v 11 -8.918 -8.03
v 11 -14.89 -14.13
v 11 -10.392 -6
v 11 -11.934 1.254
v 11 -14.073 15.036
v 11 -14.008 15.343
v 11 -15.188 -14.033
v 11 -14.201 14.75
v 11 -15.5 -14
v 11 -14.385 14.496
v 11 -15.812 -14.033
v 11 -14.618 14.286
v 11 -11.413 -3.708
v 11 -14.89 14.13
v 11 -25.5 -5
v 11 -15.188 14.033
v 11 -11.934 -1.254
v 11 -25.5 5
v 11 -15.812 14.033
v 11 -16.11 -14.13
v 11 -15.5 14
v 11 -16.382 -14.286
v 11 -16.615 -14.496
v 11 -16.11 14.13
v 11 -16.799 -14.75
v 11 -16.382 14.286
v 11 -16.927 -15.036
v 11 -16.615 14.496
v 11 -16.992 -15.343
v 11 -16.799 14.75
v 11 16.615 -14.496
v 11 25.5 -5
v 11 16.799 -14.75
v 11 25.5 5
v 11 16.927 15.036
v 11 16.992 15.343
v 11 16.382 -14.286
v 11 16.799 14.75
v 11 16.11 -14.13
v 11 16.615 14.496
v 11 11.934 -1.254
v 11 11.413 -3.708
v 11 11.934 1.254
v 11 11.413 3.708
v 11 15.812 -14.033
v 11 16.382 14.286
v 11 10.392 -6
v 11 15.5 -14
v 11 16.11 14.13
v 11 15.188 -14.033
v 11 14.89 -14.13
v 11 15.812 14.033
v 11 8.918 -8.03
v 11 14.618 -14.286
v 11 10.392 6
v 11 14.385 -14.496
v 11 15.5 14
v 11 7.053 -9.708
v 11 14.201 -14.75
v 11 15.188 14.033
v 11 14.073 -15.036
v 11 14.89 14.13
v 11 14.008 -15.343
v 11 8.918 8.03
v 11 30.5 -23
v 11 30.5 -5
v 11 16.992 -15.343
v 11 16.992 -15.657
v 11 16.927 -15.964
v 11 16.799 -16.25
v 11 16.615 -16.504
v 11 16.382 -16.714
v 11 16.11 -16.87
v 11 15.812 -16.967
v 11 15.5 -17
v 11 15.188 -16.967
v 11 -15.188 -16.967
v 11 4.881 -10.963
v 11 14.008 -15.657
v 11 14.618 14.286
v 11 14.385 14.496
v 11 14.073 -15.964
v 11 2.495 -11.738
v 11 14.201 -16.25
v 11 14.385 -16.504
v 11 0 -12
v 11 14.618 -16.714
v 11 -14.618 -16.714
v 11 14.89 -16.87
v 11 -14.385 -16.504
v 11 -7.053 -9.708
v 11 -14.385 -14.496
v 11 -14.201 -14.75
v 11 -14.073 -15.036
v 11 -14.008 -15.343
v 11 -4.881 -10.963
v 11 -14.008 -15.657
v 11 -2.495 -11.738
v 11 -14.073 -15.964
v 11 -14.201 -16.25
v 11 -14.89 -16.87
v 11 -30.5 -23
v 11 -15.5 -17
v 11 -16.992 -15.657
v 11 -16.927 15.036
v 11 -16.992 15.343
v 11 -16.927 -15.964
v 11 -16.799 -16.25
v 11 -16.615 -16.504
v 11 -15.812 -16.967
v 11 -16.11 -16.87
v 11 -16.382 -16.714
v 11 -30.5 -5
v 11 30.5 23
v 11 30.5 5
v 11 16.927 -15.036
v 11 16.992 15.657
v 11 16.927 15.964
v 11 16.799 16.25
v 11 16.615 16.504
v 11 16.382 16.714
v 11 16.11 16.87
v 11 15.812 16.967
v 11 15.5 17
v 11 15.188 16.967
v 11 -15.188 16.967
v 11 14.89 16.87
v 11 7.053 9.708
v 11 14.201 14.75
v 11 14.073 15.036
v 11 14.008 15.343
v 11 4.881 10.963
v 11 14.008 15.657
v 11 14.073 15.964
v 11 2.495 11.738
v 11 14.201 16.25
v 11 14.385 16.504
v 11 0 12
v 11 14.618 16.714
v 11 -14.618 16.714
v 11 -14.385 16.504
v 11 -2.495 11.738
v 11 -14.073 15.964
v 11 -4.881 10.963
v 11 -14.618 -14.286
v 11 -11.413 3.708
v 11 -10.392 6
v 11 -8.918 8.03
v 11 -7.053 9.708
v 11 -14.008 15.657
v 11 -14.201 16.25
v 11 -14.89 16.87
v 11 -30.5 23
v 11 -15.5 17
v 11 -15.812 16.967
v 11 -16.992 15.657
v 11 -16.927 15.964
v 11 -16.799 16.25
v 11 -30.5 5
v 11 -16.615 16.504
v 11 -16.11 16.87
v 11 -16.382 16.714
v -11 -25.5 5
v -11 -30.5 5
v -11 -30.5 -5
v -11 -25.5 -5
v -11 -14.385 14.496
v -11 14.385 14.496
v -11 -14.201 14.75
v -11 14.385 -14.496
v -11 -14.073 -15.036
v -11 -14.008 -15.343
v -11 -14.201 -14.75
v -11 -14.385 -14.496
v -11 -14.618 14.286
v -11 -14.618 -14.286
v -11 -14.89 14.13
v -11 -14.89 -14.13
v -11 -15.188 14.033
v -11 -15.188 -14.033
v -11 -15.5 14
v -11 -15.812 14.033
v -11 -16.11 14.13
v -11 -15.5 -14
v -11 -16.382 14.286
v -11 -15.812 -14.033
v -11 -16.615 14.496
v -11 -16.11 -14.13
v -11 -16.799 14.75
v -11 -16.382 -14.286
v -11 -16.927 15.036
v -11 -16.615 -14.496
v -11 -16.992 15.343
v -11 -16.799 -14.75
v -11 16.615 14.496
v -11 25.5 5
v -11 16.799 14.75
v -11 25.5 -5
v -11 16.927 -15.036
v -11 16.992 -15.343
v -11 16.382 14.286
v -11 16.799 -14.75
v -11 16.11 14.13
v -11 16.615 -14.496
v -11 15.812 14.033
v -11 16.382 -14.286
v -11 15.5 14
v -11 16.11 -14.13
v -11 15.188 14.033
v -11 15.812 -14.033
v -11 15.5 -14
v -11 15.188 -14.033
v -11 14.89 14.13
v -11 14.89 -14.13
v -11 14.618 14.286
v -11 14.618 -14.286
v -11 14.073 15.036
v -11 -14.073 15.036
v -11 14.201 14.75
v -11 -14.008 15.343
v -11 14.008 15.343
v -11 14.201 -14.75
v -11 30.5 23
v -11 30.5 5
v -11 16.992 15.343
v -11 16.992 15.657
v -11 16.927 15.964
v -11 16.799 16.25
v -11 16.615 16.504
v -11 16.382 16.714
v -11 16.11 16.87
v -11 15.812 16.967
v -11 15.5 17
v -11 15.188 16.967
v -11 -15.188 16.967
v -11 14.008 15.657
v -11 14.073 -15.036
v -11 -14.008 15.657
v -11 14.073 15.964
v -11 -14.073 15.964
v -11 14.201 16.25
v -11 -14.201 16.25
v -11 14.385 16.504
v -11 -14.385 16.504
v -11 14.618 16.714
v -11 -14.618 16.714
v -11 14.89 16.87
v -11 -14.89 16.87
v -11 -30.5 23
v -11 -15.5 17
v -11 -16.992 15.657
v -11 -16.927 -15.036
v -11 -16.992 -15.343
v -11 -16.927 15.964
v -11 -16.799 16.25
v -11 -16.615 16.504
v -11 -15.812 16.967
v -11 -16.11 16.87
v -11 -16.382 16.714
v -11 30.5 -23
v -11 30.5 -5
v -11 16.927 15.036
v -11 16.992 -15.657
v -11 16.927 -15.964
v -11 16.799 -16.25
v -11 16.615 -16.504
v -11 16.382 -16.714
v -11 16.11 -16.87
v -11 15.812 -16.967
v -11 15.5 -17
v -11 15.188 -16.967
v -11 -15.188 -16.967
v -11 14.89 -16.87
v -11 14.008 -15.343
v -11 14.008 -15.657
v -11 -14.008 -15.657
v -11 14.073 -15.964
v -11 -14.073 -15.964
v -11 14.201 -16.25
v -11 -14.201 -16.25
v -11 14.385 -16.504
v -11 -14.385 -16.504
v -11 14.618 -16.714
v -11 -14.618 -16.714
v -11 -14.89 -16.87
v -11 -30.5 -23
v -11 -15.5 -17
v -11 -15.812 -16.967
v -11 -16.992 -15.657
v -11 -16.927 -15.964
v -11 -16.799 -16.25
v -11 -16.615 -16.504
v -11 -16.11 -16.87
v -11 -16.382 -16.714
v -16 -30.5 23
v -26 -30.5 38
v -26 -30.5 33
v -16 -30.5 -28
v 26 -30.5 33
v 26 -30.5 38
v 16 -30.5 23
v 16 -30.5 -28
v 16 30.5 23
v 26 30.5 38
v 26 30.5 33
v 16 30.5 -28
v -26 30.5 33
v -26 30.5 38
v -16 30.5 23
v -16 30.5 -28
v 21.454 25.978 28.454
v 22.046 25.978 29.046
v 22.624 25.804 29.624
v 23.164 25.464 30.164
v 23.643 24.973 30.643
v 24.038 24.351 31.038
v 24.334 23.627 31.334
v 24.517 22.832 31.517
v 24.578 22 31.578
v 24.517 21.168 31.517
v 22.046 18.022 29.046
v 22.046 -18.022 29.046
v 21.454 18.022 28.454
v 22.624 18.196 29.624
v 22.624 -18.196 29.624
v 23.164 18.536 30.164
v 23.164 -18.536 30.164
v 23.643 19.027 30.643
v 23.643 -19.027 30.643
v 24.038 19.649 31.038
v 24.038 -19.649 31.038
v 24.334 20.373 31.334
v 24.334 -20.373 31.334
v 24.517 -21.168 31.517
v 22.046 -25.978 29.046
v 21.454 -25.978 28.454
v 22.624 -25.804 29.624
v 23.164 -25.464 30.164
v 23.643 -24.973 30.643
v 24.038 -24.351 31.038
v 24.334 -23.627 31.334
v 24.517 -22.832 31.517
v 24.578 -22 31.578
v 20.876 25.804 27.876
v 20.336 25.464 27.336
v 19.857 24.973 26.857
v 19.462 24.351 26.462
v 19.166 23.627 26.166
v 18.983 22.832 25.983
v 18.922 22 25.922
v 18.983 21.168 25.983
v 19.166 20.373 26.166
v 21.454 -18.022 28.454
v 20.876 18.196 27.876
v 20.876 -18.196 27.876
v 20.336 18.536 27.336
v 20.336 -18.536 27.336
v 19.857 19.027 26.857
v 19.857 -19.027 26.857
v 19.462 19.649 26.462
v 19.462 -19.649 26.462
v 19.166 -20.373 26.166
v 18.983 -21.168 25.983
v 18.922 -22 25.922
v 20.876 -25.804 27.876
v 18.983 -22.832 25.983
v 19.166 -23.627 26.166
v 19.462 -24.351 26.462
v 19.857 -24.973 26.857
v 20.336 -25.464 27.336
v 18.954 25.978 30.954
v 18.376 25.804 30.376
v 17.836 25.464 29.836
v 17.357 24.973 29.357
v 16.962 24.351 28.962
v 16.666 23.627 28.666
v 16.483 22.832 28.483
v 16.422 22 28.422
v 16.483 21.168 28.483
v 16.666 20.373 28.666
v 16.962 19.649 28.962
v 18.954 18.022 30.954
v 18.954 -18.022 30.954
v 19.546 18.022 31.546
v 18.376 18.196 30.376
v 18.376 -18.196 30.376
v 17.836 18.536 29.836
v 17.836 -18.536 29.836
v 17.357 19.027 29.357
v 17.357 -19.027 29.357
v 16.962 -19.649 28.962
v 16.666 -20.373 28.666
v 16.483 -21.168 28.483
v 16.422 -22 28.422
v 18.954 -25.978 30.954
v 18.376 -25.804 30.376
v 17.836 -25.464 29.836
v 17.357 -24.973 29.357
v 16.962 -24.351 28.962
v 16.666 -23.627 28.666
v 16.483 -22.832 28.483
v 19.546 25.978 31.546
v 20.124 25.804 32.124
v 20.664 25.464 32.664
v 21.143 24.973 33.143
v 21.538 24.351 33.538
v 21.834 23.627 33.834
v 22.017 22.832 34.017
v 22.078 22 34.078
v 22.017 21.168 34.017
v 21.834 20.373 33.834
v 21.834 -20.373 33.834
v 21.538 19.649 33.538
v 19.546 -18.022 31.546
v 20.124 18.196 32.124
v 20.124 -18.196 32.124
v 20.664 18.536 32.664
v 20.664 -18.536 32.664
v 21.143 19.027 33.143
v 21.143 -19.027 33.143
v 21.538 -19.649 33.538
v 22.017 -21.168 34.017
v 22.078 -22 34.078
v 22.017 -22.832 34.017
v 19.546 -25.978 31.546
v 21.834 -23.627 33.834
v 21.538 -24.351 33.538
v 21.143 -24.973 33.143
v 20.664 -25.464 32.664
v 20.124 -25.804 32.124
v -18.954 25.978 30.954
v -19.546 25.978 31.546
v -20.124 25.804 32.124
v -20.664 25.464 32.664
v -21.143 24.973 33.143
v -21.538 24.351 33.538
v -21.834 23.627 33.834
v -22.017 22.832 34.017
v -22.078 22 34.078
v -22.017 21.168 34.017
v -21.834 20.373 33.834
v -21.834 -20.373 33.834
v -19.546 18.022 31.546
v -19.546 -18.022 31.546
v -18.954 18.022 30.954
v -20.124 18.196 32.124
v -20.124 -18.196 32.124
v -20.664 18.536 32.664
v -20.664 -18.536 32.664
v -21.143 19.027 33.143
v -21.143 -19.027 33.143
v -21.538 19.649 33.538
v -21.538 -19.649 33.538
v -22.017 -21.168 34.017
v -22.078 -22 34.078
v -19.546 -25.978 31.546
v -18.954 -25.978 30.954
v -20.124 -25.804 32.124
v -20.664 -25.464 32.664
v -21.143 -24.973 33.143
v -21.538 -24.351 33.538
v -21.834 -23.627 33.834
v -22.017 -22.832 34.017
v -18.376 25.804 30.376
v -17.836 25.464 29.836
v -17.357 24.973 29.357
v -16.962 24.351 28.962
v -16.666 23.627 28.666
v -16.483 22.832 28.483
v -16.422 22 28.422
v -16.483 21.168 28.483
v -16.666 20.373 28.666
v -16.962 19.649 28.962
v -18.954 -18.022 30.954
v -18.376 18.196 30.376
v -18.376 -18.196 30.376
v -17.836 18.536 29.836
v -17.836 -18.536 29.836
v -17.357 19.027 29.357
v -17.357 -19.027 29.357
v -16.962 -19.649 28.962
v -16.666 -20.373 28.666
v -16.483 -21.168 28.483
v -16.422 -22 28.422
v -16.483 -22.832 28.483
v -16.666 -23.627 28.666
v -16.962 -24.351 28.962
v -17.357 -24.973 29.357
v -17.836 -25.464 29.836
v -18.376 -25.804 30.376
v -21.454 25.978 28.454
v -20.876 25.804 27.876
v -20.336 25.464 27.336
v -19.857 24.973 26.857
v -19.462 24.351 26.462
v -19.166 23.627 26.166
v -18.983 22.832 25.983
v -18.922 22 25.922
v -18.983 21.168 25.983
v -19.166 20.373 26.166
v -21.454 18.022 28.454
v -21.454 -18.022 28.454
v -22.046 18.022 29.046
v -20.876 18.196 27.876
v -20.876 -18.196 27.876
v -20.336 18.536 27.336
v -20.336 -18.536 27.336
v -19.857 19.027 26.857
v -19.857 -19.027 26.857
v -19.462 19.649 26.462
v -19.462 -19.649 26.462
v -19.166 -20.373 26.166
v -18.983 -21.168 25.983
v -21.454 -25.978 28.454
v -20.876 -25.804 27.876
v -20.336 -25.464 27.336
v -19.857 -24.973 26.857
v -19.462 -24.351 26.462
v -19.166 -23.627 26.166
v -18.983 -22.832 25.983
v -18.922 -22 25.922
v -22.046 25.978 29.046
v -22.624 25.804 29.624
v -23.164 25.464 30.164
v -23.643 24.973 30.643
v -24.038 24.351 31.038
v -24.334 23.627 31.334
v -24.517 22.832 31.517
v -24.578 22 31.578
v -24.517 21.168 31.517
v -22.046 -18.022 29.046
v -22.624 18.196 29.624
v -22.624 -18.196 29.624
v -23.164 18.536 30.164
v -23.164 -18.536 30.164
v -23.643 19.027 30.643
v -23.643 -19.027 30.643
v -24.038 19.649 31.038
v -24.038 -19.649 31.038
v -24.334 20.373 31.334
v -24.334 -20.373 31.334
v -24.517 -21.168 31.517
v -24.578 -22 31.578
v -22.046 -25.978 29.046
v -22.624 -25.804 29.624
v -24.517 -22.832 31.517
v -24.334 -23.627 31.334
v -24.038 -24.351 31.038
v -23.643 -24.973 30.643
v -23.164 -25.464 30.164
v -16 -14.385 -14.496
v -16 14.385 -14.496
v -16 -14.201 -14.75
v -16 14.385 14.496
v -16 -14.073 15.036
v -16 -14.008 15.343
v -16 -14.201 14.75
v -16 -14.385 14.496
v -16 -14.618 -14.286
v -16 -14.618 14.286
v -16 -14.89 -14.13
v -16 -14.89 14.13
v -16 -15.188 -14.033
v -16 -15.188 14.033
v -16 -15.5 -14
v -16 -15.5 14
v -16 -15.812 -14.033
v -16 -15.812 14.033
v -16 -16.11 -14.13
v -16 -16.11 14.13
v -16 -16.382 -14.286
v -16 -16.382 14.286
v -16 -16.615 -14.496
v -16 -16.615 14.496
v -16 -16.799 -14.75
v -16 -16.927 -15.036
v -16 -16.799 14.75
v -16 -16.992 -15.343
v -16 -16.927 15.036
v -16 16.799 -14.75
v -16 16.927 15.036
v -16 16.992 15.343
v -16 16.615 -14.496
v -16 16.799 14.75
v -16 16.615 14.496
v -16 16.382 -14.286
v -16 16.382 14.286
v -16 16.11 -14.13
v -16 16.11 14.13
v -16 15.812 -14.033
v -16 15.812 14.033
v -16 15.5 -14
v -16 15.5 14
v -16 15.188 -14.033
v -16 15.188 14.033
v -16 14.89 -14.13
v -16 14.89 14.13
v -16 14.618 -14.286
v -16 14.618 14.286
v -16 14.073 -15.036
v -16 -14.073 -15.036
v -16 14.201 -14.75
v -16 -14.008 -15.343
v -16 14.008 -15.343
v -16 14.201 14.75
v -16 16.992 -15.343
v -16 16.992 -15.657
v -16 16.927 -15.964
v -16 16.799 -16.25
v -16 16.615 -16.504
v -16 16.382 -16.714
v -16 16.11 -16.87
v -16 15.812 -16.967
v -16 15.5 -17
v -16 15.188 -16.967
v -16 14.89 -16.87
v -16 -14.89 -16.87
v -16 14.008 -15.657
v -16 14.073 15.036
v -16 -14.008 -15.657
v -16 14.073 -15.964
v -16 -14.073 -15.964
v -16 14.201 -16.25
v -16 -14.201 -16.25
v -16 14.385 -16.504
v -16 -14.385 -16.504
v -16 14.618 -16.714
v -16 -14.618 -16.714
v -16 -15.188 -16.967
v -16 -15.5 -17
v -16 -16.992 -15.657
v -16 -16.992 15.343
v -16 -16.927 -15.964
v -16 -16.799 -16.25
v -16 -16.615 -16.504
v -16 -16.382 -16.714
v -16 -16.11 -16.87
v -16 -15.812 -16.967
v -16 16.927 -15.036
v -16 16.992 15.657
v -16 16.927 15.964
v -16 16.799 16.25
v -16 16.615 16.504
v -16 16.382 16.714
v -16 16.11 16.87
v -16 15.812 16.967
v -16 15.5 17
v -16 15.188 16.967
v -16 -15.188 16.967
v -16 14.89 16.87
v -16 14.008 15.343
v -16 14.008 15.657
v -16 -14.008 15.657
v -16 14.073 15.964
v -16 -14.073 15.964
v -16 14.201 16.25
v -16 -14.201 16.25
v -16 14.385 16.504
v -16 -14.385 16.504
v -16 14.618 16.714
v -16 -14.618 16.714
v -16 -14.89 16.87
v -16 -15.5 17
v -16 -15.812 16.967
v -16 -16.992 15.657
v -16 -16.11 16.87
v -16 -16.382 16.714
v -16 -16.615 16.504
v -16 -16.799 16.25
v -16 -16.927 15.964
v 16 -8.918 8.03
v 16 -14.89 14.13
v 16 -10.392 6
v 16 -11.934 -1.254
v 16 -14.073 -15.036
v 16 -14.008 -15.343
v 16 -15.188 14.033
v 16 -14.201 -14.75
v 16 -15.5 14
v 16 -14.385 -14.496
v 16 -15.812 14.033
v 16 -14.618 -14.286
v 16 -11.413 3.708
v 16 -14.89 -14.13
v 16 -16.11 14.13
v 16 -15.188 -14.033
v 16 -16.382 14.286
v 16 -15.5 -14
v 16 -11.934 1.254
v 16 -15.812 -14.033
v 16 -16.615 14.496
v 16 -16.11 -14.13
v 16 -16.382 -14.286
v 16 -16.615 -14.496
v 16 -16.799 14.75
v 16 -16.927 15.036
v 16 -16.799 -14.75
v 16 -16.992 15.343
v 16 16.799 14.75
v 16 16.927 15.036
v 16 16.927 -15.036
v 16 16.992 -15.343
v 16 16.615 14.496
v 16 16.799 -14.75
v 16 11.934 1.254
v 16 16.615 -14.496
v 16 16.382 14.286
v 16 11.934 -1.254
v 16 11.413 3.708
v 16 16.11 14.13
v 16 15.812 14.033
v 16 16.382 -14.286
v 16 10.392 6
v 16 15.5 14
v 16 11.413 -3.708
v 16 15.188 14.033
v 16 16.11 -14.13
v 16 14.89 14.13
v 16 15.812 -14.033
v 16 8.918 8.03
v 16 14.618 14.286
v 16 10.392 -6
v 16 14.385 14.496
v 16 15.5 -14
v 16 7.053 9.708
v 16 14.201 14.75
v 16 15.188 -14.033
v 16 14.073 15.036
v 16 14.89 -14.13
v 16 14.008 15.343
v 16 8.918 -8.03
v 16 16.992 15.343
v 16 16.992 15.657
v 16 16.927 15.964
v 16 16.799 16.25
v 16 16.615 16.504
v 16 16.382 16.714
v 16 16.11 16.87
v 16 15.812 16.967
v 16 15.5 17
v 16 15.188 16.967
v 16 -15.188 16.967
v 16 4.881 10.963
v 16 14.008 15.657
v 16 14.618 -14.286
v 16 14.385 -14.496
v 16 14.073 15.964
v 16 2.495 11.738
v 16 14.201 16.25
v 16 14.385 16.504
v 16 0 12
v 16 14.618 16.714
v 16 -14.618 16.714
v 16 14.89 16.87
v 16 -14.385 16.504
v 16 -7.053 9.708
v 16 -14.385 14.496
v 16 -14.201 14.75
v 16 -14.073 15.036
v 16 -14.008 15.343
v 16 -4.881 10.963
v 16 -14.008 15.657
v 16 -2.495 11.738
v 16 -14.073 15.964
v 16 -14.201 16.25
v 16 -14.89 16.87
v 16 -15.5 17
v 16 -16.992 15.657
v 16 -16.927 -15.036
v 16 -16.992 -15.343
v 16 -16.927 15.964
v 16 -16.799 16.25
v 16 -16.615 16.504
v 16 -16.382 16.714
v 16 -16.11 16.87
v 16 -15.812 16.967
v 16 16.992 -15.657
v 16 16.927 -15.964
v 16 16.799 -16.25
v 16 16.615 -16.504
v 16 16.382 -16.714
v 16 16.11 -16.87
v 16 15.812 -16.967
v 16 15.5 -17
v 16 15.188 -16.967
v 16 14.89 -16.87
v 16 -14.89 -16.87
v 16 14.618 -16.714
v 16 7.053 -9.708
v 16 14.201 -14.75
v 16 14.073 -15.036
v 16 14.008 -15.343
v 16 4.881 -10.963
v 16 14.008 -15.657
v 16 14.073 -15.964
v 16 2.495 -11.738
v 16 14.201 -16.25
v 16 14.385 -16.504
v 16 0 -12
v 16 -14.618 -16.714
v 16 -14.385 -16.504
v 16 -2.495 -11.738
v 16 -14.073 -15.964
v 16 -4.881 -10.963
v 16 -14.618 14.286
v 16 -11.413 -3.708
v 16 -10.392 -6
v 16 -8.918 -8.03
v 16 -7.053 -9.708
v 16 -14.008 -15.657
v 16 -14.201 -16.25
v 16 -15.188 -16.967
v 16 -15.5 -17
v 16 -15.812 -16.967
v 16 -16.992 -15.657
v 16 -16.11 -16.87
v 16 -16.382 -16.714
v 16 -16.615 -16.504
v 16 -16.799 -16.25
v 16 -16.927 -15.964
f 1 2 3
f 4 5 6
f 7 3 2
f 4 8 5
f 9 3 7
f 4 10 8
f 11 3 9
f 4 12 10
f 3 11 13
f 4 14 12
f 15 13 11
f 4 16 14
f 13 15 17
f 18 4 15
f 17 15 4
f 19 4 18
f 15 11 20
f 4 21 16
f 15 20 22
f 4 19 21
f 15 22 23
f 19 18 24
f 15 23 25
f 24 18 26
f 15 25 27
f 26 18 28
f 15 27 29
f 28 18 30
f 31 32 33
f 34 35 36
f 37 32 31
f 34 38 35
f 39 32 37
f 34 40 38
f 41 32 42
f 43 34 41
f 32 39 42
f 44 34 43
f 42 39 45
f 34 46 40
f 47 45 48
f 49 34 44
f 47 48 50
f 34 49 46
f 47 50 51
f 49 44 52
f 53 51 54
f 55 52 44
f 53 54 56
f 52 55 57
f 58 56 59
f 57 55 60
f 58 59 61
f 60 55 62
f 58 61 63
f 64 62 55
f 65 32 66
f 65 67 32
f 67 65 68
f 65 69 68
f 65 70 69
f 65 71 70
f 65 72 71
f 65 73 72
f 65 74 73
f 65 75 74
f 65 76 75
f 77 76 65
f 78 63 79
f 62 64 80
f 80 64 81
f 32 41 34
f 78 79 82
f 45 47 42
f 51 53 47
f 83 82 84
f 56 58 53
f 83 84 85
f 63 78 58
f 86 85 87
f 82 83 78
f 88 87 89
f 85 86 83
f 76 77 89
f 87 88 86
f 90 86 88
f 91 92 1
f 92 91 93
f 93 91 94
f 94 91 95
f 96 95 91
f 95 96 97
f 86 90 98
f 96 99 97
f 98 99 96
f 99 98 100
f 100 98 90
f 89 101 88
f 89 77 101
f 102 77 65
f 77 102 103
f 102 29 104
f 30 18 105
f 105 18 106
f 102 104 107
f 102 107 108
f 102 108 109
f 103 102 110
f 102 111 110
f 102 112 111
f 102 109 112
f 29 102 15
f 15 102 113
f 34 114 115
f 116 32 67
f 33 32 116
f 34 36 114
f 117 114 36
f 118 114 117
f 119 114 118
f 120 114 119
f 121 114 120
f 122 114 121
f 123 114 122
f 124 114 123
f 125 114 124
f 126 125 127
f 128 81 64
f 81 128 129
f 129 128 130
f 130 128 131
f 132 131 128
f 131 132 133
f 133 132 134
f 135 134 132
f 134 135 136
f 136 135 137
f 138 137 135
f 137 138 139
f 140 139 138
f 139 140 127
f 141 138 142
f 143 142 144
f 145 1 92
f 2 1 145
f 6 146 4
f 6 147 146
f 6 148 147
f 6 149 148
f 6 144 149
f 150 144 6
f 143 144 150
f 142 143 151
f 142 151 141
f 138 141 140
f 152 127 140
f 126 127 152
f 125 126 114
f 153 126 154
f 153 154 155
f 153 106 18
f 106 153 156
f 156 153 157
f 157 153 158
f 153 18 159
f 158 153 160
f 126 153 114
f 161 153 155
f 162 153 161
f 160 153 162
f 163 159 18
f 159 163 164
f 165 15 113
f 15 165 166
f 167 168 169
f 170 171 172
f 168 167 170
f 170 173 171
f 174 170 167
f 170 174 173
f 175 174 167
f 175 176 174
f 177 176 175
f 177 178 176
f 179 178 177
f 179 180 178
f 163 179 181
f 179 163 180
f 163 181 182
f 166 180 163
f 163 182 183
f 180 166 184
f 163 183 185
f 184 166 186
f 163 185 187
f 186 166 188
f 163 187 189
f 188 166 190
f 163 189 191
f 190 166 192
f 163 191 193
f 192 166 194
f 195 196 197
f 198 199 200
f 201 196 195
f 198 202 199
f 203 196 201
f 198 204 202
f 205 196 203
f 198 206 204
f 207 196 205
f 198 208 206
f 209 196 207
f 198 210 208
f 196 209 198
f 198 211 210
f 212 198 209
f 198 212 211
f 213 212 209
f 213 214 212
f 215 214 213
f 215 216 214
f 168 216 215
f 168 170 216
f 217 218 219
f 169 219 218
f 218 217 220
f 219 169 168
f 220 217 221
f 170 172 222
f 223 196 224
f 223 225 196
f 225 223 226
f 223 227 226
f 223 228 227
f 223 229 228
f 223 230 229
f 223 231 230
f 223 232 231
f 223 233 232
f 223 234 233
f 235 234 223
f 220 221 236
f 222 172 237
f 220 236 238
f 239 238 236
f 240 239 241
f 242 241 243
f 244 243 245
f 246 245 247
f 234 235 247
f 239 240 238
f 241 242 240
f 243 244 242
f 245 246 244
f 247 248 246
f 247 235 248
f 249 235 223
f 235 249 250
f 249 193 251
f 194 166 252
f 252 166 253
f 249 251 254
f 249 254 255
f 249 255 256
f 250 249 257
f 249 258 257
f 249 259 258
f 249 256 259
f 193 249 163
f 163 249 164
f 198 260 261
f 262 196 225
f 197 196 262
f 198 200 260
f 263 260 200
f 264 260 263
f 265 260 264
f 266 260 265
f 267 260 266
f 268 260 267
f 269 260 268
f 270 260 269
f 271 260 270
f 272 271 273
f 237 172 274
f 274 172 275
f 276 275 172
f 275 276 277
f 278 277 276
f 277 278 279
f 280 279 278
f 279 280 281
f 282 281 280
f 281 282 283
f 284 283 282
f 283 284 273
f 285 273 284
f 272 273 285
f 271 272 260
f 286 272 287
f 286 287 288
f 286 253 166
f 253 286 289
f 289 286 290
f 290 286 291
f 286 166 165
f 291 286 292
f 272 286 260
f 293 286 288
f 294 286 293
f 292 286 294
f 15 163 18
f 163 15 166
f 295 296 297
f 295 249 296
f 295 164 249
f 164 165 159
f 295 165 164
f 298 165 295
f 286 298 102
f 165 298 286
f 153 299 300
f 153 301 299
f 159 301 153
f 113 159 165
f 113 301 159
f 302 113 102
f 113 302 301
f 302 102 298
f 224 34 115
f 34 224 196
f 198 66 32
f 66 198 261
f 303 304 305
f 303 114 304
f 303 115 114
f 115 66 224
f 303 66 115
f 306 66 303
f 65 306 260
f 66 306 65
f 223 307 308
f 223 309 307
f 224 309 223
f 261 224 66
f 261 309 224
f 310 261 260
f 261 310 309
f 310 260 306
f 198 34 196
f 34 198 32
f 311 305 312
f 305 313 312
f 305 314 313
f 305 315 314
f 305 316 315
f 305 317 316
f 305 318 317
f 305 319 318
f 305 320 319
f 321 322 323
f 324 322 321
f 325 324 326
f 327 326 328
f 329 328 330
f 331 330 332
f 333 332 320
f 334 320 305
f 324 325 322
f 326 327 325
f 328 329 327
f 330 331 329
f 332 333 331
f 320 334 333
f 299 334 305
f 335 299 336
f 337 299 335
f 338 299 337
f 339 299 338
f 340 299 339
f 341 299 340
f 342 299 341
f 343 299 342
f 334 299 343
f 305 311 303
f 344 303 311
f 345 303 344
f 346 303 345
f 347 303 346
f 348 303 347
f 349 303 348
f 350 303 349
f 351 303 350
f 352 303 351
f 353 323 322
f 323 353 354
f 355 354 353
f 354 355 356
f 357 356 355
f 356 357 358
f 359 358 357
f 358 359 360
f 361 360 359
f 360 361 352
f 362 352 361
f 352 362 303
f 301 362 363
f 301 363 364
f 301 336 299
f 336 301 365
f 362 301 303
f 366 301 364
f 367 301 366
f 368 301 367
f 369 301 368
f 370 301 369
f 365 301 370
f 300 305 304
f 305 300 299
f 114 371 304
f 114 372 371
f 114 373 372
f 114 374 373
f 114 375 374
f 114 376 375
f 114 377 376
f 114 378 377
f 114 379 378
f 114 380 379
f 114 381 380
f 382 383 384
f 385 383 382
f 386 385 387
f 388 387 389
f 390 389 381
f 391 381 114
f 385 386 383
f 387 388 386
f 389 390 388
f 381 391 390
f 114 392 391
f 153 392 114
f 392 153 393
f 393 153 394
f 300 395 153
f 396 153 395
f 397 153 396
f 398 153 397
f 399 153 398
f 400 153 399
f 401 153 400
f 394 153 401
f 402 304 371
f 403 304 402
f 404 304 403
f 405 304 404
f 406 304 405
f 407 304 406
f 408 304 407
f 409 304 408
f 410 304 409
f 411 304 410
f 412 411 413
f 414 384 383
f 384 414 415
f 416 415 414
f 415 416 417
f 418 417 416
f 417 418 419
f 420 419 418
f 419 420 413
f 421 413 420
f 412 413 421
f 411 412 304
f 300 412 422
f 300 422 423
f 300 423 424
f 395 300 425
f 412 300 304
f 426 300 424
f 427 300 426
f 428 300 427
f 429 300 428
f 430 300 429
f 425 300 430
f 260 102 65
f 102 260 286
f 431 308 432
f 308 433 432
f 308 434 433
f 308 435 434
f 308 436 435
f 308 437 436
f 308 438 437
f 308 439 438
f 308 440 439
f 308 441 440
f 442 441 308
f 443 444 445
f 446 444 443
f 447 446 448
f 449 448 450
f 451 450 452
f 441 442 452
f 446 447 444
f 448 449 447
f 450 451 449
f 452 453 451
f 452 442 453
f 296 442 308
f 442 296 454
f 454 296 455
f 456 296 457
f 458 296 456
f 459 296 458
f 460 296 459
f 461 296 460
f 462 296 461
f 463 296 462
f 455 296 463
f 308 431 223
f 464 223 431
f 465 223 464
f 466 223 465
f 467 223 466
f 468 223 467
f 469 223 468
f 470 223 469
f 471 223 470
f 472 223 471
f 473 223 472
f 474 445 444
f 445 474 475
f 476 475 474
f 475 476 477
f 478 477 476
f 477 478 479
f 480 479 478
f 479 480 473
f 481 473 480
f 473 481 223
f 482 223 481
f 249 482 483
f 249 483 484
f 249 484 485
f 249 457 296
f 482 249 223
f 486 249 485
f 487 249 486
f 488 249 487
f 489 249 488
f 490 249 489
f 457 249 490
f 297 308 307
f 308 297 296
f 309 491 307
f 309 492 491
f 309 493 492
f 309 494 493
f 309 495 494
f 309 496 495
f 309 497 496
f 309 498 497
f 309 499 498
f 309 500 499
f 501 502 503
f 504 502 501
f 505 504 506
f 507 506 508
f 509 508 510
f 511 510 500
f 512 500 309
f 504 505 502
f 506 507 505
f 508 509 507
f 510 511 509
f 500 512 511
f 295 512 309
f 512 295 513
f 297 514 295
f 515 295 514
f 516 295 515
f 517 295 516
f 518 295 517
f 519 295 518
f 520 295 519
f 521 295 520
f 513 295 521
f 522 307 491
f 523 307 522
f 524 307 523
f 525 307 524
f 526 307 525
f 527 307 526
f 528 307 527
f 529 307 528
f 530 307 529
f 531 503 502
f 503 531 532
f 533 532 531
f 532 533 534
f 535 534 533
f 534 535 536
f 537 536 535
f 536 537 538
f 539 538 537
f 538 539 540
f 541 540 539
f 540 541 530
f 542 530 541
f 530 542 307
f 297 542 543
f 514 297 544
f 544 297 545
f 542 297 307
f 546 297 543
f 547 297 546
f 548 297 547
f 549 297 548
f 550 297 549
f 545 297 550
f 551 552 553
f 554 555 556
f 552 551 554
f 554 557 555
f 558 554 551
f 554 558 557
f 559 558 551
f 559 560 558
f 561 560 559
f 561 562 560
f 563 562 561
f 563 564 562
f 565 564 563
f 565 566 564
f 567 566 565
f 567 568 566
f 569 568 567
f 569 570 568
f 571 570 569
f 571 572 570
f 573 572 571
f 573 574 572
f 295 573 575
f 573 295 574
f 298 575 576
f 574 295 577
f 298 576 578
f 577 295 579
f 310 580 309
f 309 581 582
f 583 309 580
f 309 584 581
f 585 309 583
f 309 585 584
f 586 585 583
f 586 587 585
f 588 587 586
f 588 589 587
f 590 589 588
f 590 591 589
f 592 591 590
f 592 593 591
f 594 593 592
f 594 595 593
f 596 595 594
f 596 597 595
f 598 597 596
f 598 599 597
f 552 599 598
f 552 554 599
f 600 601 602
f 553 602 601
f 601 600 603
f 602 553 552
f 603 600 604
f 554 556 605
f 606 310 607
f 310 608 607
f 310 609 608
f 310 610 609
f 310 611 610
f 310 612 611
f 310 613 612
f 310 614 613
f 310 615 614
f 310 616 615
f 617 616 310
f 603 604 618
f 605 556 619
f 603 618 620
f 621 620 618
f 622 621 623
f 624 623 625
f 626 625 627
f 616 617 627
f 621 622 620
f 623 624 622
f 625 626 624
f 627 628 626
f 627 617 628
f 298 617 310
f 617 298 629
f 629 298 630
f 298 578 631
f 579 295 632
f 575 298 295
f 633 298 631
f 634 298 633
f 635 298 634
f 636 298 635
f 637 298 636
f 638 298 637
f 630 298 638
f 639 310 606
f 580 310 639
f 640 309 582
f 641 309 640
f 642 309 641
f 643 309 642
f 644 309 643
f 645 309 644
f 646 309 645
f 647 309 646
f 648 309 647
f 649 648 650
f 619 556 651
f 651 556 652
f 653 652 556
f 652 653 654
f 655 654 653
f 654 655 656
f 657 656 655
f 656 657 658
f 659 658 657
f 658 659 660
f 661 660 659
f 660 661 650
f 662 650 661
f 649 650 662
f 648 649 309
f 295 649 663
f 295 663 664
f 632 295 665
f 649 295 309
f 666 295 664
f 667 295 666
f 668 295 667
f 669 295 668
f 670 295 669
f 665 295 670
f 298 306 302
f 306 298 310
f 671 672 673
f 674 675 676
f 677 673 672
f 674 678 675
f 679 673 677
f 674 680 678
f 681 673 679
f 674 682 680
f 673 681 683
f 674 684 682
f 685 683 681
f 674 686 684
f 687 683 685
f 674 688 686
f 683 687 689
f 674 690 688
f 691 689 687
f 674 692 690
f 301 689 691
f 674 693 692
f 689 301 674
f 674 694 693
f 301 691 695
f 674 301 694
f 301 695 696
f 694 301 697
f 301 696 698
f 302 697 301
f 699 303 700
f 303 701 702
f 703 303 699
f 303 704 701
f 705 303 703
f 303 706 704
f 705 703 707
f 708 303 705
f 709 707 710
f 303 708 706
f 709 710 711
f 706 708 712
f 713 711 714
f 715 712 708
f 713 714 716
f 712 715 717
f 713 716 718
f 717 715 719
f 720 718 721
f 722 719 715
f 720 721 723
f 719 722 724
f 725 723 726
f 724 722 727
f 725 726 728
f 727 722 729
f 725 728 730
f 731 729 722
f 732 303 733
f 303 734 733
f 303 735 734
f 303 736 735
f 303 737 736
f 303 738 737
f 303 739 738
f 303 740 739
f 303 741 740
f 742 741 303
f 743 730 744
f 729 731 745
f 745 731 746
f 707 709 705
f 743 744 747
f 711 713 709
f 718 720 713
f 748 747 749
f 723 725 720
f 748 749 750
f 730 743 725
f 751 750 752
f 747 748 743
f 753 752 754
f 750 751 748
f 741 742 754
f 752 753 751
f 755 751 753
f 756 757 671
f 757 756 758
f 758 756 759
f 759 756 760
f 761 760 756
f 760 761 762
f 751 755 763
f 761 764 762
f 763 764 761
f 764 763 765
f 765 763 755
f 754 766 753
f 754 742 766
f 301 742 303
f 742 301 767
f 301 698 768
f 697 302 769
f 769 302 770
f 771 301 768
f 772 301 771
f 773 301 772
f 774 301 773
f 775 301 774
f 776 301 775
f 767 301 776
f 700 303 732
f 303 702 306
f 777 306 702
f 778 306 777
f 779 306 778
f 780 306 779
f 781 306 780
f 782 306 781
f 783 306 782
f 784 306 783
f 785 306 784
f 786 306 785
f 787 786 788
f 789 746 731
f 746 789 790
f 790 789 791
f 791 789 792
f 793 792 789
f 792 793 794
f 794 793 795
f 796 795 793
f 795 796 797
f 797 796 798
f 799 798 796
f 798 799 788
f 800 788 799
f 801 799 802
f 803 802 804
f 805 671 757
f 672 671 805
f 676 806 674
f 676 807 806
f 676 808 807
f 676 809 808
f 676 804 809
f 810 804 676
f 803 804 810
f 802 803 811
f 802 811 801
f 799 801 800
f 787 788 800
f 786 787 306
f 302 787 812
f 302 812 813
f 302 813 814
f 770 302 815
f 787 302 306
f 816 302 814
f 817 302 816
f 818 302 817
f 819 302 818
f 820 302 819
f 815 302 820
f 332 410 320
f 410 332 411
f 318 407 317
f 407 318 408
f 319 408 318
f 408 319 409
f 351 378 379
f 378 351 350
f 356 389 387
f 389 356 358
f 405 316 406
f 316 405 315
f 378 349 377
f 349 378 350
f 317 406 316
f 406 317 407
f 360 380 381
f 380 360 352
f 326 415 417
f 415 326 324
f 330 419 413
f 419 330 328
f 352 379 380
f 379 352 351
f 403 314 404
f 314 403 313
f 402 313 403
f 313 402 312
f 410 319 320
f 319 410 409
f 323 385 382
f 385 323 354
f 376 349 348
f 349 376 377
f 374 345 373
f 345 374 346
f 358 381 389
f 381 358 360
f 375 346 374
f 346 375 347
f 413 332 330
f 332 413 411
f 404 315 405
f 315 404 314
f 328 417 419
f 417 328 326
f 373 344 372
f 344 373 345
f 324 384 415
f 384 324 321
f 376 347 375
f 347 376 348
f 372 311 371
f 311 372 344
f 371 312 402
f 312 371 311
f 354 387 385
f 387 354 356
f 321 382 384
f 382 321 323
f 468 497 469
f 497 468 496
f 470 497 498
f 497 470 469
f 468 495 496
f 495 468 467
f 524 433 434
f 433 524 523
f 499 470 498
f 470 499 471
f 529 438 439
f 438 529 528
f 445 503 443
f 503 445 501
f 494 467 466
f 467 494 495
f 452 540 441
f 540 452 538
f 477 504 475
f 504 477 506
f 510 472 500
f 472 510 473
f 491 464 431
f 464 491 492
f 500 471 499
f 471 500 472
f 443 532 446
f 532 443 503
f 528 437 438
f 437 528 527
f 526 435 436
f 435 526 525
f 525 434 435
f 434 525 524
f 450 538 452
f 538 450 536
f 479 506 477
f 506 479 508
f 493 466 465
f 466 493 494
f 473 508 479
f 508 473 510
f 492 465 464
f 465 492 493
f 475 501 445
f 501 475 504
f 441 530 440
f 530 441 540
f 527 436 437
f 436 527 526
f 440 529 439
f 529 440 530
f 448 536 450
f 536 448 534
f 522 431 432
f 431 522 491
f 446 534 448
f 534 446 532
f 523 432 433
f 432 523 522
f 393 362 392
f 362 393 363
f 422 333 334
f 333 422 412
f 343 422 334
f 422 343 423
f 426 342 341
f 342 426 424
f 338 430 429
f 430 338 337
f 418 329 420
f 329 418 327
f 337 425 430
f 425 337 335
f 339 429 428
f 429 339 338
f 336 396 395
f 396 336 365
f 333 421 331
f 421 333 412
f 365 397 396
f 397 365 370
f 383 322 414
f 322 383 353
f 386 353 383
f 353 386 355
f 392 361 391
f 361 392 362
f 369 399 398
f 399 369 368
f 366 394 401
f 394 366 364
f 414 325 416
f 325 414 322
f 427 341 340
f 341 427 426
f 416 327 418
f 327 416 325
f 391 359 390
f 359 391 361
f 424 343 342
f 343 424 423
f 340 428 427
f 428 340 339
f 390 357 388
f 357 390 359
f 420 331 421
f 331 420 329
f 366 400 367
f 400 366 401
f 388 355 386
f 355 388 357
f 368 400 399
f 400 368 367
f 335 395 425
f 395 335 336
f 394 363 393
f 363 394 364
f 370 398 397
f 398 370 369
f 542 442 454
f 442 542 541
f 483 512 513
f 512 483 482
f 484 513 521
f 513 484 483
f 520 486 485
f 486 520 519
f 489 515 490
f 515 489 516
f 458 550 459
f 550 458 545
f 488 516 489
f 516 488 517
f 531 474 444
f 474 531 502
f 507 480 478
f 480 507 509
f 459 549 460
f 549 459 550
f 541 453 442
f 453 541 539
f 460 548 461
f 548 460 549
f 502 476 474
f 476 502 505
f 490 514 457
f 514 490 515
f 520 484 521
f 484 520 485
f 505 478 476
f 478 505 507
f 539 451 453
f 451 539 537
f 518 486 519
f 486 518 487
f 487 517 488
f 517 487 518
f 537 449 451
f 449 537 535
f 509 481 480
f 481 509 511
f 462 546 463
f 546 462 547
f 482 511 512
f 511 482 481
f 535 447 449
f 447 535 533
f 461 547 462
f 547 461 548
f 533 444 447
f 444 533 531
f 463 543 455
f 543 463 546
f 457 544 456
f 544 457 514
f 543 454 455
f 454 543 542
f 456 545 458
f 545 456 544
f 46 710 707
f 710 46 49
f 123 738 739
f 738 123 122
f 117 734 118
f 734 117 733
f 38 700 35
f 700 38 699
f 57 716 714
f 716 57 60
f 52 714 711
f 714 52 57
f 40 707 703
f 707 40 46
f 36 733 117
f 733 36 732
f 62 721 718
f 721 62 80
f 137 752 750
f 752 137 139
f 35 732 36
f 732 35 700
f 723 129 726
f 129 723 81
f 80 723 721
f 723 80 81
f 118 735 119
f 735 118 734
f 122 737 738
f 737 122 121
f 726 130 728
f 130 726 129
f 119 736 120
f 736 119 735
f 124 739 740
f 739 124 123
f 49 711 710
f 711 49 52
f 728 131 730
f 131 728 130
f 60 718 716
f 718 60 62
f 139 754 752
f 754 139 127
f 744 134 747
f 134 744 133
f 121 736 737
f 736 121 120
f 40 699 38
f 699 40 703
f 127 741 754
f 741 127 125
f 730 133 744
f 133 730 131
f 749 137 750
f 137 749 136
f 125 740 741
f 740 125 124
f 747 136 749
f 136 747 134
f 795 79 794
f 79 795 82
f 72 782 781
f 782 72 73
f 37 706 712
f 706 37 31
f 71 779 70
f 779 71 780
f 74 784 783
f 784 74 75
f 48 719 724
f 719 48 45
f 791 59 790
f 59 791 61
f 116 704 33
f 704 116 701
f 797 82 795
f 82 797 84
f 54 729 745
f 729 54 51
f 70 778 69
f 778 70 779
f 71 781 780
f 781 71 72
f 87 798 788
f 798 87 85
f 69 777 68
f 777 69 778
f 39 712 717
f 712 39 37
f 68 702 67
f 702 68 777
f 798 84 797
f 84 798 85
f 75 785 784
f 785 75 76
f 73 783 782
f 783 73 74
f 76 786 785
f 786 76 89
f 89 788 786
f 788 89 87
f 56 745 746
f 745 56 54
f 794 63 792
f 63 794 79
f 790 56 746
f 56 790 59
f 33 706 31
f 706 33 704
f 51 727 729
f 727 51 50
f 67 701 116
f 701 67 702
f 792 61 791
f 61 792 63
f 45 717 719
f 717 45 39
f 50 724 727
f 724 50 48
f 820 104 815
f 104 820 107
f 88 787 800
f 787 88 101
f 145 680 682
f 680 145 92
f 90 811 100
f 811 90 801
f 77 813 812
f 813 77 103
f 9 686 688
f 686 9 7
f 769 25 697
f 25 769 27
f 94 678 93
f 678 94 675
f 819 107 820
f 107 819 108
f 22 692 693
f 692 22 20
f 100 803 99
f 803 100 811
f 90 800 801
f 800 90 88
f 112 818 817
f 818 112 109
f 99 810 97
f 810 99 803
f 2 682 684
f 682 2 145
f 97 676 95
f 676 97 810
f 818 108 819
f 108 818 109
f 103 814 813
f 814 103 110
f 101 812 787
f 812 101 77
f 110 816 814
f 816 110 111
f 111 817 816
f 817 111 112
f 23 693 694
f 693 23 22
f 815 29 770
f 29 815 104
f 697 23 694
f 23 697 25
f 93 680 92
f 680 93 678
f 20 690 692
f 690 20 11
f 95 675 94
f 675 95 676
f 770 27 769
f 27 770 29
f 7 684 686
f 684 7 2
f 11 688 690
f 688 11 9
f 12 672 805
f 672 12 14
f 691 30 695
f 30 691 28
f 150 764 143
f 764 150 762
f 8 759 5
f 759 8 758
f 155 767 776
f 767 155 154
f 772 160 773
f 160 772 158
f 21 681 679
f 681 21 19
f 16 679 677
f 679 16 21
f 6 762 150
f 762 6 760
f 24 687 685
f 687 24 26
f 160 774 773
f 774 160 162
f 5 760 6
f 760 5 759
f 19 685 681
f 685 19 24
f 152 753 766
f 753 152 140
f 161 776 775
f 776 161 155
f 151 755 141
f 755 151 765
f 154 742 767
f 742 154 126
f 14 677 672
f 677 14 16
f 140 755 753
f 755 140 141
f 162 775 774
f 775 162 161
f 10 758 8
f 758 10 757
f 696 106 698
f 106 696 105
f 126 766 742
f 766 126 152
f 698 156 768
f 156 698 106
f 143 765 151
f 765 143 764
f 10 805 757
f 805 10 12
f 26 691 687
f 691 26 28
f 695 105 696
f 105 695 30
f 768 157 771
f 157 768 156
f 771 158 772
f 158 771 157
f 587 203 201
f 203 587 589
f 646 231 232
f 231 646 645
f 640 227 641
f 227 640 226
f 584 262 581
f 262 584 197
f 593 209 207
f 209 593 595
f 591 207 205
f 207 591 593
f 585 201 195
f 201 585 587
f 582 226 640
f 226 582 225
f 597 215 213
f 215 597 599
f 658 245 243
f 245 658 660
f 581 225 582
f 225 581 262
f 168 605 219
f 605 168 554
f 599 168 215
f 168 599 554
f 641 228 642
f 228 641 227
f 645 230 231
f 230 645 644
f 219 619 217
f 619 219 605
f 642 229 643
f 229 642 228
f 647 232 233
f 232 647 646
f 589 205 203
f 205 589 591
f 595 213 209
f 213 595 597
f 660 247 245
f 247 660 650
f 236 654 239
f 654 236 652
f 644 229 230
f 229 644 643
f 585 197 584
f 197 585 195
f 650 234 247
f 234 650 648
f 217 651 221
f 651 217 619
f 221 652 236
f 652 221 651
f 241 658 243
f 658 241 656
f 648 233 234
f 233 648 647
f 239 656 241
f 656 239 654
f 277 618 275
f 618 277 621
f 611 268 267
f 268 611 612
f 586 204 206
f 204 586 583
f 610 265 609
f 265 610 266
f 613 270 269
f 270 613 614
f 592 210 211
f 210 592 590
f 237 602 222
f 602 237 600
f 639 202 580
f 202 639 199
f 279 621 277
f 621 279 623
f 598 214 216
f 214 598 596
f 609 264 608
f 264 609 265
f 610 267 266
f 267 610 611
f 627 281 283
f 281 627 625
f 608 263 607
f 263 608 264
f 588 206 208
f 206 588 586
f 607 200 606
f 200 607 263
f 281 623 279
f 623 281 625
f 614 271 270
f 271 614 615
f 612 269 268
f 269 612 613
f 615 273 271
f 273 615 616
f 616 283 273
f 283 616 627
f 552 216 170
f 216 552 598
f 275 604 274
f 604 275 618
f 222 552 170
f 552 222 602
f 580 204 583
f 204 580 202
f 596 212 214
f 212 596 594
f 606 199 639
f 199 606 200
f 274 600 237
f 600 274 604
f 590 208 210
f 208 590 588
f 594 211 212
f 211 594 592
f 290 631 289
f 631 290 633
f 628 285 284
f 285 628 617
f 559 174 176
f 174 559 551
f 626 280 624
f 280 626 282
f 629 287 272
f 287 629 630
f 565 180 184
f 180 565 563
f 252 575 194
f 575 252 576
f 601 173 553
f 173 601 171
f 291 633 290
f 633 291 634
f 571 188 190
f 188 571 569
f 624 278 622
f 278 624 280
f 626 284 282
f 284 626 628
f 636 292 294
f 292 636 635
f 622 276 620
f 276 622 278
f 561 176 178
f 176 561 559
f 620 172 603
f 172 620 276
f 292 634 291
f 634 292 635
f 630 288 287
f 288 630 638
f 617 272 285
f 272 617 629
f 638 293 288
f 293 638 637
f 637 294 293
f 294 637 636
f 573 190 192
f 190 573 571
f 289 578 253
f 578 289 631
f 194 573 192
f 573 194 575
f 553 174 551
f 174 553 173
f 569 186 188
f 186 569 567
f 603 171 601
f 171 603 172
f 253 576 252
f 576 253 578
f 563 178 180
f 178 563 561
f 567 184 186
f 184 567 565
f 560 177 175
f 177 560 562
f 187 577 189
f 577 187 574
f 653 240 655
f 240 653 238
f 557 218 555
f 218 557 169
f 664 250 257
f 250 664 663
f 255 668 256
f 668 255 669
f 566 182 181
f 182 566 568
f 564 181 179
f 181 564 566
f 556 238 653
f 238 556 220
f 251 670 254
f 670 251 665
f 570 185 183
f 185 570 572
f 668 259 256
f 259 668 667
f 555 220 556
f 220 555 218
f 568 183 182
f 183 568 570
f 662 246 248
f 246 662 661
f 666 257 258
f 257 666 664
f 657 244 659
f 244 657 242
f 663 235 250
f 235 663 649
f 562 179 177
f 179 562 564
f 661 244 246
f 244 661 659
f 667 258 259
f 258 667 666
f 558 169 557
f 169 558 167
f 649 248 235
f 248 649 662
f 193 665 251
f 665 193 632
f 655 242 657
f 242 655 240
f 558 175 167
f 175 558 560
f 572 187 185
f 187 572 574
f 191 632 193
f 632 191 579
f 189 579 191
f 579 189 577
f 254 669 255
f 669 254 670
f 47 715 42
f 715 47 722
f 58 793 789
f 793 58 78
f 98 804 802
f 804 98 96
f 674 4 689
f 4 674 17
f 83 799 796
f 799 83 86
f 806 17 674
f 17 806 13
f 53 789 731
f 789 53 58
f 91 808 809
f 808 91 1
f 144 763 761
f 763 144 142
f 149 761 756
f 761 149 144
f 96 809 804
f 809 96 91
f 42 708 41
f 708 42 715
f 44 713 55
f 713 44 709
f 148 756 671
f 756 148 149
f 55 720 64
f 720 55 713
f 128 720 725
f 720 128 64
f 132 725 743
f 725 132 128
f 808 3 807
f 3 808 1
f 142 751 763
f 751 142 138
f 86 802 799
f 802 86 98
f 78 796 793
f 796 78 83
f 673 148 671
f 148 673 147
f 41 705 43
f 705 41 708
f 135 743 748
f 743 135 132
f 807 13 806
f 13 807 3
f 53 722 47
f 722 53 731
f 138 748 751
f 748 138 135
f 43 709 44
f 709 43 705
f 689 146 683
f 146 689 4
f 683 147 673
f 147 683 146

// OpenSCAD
module Supports(gearWidth = 20, depth = 61){
  thickness = 5;
  height=10;
  translate([0, -depth / 2 + thickness / 2, 0]){
    cube(size = [gearWidth + 2, thickness, height], center = true);
  }
  translate([0, depth / 2 - thickness / 2, 0]){
    cube(size = [gearWidth + 2, thickness, height], center = true);
  }
}

module MotorHole(gearWidth = 20){
  translate([gearWidth / 2, 0, 0]){
    rotate([0, 90, 0]){
      cylinder(d = 24, h = 20, center = true);
    }
  }
}

module MotorMountHoles(gearWidth = 20){
  $fn = 30;
  translate([gearWidth / 2, 15.5, 15.5]){
    rotate([0, 90, 0]){
      cylinder(d = 3, h = 20, center = true);
    }
  }
  translate([gearWidth / 2, 15.5, -15.5]){
    rotate([0, 90, 0]){
      cylinder(d = 3, h = 20, center = true);
    }
  }
  translate([gearWidth / 2, -15.5, -15.5]){
    rotate([0, 90, 0]){
      cylinder(d = 3, h = 20, center = true);
    }
  }
  translate([gearWidth / 2, -15.5, 15.5]){
    rotate([0, 90, 0]){
      cylinder(d = 3, h = 20, center = true);
    }
  }
}

module BearingHoles(gearWidth = 20, depth = 61){
  translate([gearWidth, 22, depth / 2]){
    rotate([0, -45, 0]){
      cylinder(d = 8, h = 10, center = true, $fn = 30);
    }
  }

  translate([-gearWidth, 22, depth / 2]){
    rotate([0, 45, 0]){
      cylinder(d = 8, h = 10, center = true, $fn = 30);
    }
  }
  translate([gearWidth, -22, depth / 2]){
    rotate([0, -45, 0]){
      cylinder(d = 8, h = 10, center = true, $fn = 30);
    }
  }

  translate([-gearWidth, -22, depth / 2]){
    rotate([0, 45, 0]){
      cylinder(d = 8, h = 10, center = true, $fn = 30);
    }
  }
}

module BasePlate(gearOuterDiameter = 150, gearWidth = 20){
  gearRidge = 5;
  motorHeight = 41;
  height = motorHeight + gearRidge;
  innerWidth = gearWidth + 2;
  depth = motorHeight + 20;

  difference(){
    union(){
      rotate([90, 0, 0]){
        translate([0, 0, -depth / 2]){
          linear_extrude(depth){
            polygon(points = [
                [-innerWidth / 2, -height / 2],
                [-innerWidth / 2, height / 2],
                // inner left side
                [-innerWidth / 2 - 15, height / 2 + 15],
                // 45 deg out
                [-innerWidth / 2 - 15, height / 2 + 10],
                // 5 down
                [-innerWidth / 2 - 5, height / 2],
                // 45 deg in
                [-innerWidth / 2 - 5, -height / 2 - 5],
                // outer left side
                [innerWidth / 2 + 5, -height / 2 - 5],
                // outer bottom
                [innerWidth / 2 + 5, height / 2],
                // outer bottom
                [innerWidth / 2 + 15, height / 2 + 10],
                // 5 down
                [innerWidth / 2 + 15, height / 2 + 15],
                // 45 deg out
                [innerWidth / 2, height / 2],
                [innerWidth / 2, -height / 2]
              ]);
          }
        }
      }
      Supports(gearWidth, depth);
    }
    BearingHoles(gearWidth);
    MotorHole(gearWidth);
    MotorMountHoles(gearWidth);
    mirror([1, 0, 0]){
      MotorMountHoles();
    }

  }
}

BasePlate();
